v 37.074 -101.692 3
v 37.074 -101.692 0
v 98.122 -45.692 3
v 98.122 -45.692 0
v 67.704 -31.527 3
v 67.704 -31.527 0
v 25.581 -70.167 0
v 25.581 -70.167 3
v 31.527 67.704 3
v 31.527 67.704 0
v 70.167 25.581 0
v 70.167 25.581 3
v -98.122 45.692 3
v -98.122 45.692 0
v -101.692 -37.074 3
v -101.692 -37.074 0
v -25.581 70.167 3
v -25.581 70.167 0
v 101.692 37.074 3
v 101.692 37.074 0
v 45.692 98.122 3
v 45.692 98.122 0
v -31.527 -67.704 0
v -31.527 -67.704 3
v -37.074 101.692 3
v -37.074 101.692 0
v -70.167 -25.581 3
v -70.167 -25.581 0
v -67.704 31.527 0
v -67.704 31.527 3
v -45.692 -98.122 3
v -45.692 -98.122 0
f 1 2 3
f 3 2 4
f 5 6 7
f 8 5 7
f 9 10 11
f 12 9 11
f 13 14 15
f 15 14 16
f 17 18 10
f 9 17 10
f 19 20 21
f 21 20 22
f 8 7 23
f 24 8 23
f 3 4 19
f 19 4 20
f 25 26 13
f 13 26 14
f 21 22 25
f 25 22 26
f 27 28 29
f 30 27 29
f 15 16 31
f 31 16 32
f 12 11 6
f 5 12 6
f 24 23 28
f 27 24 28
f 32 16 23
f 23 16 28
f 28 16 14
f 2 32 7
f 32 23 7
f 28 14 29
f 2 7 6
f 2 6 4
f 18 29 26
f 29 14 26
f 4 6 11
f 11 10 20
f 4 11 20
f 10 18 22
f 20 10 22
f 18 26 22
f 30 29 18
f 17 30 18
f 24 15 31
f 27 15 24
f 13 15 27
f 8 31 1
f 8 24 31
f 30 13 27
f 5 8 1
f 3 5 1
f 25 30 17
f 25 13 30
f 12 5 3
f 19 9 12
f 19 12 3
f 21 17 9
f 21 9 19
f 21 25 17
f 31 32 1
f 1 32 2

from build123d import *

# Parameters (mm, degrees)
SALIENTE_EXTRUIR1_DEPTH = 3
CORTAR_EXTRUIR1_DEPTH   = 3


with BuildPart() as part:
    # Croquis1 → Saliente-Extruir1 (new body)
    with BuildSketch(Plane.XY):
        Polygon((-45.692015403, -98.122211965), (37.073747528, -101.692015403), (98.122211965, -45.692015403), (101.692015403, 37.073747528), (45.692015403, 98.122211965), (-37.073747528, 101.692015403), (-98.122211965, 45.692015403), (-101.692015403, -37.073747528), align=None)
    extrude(amount=SALIENTE_EXTRUIR1_DEPTH)

    # Croquis2 → Cortar-Extruir1 (cut)
    with BuildSketch(Plane(origin=(0, 0, 0), x_dir=(-1, 0, 0), z_dir=(0, 0, -1))):
        Polygon((-67.704326256, -31.527490628), (-25.580885794, -70.167490628), (31.527490628, -67.704326256), (70.167490628, -25.580885794), (67.704326256, 31.527490628), (25.580885794, 70.167490628), (-31.527490628, 67.704326256), (-70.167490628, 25.580885794), align=None)
    extrude(amount=-CORTAR_EXTRUIR1_DEPTH, mode=Mode.SUBTRACT)


solid = part.part
